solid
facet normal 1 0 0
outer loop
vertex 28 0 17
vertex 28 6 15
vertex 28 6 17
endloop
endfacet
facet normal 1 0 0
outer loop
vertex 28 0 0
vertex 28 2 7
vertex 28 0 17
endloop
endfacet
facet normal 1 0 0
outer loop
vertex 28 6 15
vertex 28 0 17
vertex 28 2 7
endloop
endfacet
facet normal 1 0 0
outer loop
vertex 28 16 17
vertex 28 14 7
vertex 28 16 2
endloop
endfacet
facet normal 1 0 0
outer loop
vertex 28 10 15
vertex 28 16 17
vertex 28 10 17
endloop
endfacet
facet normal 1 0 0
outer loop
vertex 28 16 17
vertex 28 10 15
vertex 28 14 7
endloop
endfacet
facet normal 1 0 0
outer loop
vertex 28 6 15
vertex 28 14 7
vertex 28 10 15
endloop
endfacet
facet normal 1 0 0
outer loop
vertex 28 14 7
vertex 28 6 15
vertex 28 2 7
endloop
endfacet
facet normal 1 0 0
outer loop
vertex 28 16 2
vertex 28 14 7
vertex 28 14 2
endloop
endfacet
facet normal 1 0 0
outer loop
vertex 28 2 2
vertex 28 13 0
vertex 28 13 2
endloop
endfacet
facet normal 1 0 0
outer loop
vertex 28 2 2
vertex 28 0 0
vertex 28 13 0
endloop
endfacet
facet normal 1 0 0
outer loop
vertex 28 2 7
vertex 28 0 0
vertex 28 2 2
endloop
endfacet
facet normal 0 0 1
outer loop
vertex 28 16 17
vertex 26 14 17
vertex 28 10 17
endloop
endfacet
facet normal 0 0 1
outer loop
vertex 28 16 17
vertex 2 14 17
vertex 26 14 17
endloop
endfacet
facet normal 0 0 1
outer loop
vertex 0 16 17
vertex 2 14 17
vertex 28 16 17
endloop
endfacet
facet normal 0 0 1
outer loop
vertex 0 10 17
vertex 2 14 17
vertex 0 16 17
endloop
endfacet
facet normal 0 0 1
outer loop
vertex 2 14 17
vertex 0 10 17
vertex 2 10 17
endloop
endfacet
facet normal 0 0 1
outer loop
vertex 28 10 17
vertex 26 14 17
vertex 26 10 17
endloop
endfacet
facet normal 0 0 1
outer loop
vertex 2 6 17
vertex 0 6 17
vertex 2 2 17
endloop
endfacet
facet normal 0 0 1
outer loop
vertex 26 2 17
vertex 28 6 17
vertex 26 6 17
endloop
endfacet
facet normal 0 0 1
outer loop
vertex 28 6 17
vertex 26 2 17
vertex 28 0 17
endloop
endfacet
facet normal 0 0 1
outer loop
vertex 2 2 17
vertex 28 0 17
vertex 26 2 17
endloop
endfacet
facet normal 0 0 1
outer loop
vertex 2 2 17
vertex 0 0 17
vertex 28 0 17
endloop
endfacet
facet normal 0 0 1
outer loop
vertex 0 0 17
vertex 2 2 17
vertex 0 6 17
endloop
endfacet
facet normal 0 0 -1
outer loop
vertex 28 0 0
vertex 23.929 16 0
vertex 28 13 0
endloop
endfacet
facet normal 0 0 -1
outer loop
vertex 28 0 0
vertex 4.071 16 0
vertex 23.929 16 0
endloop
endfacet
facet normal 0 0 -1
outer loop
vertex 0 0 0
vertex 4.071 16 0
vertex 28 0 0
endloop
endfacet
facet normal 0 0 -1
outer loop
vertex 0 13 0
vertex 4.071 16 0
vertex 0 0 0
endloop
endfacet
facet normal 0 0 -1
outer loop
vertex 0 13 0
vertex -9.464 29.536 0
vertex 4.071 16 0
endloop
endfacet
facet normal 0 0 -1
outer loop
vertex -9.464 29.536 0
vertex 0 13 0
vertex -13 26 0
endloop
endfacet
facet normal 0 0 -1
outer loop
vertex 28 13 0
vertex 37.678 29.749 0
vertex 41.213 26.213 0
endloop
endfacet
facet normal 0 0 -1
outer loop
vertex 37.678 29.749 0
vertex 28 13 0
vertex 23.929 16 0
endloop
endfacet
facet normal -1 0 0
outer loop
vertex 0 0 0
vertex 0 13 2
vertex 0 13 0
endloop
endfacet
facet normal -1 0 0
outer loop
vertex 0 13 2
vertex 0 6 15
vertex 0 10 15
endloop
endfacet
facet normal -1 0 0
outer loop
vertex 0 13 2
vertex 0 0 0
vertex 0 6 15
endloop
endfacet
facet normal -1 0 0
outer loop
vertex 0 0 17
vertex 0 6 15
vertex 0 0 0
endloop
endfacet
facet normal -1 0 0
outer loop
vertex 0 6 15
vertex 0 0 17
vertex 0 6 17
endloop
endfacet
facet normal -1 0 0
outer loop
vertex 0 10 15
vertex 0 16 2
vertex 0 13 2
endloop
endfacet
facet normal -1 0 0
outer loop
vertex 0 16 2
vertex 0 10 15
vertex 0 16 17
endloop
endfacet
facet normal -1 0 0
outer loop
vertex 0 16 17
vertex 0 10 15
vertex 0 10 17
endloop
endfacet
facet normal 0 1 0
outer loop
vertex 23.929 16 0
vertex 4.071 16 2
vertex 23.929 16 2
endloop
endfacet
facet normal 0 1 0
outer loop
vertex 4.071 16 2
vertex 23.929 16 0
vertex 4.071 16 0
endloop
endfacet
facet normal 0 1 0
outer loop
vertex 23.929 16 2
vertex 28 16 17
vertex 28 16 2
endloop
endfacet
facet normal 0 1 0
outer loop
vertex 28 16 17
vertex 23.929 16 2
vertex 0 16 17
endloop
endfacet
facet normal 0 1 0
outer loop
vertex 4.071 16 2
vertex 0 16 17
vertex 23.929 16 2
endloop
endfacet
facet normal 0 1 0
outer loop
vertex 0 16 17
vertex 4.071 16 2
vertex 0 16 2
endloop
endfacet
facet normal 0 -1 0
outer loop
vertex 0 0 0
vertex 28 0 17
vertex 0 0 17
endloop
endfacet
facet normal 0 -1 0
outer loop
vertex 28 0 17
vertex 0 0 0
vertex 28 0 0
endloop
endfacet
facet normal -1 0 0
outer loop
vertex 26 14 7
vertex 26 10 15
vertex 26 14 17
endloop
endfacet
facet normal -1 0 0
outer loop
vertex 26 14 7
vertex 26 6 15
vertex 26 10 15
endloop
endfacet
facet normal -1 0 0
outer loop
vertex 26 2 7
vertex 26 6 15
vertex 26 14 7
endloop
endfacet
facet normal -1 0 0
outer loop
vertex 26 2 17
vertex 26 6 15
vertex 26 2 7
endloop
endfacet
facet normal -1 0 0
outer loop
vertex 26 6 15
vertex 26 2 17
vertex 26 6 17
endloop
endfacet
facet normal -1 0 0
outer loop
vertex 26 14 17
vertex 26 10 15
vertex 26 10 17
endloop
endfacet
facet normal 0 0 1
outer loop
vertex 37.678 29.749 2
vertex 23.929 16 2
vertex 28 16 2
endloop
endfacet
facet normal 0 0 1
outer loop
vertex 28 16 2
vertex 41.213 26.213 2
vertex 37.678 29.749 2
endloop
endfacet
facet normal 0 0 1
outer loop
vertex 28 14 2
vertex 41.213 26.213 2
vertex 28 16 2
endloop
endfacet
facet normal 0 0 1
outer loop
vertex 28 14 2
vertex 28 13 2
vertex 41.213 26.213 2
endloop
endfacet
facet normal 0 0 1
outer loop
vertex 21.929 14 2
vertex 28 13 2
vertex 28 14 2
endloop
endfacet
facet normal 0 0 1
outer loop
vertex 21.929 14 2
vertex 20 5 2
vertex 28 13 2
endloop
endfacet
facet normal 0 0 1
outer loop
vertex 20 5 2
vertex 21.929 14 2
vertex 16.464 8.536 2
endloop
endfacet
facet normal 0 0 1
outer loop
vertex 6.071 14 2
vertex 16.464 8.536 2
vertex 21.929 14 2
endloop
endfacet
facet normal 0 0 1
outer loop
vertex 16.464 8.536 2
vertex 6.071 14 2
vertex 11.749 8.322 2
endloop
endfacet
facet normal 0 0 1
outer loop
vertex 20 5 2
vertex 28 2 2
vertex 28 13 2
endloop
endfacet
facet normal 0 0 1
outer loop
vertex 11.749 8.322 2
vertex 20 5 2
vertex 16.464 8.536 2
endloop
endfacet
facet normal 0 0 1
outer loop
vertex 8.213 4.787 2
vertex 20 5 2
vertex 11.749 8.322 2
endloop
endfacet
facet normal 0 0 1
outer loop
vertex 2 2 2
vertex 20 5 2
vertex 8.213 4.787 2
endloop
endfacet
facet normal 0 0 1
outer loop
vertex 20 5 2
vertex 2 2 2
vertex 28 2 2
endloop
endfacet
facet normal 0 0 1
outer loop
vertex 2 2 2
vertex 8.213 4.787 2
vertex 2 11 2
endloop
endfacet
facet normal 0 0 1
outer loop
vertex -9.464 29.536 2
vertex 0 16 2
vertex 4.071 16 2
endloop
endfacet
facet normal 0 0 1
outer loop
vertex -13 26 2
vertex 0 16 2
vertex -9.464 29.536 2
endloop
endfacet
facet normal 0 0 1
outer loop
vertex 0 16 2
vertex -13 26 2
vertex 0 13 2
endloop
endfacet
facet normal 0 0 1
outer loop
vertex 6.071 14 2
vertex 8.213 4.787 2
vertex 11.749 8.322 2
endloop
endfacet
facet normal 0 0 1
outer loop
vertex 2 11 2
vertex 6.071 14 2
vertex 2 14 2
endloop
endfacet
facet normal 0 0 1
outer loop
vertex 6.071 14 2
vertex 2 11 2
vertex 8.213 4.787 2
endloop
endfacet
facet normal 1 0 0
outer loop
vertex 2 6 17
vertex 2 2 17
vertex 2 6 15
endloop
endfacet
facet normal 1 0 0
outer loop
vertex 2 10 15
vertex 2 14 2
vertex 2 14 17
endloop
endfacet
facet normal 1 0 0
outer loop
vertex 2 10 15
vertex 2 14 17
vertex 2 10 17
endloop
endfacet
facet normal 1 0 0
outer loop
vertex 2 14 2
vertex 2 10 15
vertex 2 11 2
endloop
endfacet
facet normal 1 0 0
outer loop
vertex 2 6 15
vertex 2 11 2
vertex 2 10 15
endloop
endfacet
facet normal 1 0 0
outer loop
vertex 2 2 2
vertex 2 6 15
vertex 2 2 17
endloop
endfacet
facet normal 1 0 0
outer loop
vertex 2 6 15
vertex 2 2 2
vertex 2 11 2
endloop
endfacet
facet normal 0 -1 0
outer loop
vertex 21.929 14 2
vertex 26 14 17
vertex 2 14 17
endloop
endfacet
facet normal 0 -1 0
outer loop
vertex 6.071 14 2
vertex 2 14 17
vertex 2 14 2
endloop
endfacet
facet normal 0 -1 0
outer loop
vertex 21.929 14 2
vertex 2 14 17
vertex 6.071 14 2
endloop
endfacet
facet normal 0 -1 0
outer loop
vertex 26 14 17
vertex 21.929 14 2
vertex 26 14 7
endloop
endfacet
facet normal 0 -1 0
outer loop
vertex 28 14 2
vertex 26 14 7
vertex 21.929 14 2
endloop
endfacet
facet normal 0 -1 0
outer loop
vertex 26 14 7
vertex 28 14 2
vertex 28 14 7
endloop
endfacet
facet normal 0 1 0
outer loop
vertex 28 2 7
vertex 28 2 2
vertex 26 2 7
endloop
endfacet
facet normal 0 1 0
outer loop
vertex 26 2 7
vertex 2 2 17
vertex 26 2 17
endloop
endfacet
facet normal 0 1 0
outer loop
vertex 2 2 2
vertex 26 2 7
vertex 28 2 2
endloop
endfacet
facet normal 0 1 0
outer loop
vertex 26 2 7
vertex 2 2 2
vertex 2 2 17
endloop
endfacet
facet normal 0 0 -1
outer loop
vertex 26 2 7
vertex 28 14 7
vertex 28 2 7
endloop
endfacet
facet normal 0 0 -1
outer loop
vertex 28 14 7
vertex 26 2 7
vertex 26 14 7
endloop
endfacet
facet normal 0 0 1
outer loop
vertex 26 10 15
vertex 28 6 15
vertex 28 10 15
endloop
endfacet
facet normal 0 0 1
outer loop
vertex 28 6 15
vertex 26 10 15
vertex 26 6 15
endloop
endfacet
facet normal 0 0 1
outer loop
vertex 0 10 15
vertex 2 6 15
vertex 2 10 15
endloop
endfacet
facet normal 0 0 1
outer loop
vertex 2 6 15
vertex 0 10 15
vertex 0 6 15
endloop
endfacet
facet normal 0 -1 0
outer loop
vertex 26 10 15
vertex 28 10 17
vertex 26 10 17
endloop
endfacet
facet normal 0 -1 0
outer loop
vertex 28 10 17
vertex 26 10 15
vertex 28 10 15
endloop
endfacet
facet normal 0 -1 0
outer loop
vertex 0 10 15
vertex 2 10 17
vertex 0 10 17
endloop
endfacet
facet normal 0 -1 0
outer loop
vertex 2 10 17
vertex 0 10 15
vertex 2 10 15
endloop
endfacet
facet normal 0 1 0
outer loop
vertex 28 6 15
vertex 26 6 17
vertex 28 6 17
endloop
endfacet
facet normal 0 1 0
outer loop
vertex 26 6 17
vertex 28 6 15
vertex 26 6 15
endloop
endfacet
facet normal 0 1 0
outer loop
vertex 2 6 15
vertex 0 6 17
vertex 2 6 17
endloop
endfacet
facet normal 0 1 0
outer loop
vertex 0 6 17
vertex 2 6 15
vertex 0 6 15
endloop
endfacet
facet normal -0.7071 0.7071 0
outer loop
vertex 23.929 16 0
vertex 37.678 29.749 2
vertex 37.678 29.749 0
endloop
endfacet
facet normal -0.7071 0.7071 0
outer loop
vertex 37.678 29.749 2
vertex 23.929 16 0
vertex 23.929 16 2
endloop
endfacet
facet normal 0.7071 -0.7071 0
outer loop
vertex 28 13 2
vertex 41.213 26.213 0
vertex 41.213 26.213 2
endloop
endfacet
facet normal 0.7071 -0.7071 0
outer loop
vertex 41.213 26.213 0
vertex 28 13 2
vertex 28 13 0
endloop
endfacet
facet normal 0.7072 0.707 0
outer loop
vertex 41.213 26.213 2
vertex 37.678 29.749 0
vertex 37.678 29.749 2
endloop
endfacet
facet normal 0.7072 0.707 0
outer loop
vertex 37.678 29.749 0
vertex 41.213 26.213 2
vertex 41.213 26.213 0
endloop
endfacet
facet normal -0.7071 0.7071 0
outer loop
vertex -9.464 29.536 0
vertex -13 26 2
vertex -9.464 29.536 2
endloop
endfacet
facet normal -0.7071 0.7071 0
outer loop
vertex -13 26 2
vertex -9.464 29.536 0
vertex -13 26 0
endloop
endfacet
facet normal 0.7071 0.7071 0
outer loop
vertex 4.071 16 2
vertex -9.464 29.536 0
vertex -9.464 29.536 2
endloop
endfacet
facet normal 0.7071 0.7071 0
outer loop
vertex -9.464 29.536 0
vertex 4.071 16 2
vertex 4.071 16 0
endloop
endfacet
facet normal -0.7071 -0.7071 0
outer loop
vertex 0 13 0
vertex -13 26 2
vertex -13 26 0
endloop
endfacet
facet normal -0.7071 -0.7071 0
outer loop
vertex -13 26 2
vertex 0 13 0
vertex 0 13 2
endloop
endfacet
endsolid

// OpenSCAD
//MINI SERVO HOLDER
//just for show
//JGH 17/12/2013

difference(){
	cube([28, 16, 17]);	//main box
	
	translate([2,2,2])
	cube([24, 12, 15]);	//hole for servo body
	
	translate([20,2,2])	//hole for servo connector
	cube([10, 12, 5]);
	
	translate([-2,6,15])	//holes for servo screw heads
	cube([30, 4, 2]);

}

translate([20, 5, 0])		//support legs
rotate([0,0,45])
cube([30, 5, 2]);

translate([-13, 26, 0])	//support legs
rotate([0,0,-45])
cube([30, 5, 2]);
